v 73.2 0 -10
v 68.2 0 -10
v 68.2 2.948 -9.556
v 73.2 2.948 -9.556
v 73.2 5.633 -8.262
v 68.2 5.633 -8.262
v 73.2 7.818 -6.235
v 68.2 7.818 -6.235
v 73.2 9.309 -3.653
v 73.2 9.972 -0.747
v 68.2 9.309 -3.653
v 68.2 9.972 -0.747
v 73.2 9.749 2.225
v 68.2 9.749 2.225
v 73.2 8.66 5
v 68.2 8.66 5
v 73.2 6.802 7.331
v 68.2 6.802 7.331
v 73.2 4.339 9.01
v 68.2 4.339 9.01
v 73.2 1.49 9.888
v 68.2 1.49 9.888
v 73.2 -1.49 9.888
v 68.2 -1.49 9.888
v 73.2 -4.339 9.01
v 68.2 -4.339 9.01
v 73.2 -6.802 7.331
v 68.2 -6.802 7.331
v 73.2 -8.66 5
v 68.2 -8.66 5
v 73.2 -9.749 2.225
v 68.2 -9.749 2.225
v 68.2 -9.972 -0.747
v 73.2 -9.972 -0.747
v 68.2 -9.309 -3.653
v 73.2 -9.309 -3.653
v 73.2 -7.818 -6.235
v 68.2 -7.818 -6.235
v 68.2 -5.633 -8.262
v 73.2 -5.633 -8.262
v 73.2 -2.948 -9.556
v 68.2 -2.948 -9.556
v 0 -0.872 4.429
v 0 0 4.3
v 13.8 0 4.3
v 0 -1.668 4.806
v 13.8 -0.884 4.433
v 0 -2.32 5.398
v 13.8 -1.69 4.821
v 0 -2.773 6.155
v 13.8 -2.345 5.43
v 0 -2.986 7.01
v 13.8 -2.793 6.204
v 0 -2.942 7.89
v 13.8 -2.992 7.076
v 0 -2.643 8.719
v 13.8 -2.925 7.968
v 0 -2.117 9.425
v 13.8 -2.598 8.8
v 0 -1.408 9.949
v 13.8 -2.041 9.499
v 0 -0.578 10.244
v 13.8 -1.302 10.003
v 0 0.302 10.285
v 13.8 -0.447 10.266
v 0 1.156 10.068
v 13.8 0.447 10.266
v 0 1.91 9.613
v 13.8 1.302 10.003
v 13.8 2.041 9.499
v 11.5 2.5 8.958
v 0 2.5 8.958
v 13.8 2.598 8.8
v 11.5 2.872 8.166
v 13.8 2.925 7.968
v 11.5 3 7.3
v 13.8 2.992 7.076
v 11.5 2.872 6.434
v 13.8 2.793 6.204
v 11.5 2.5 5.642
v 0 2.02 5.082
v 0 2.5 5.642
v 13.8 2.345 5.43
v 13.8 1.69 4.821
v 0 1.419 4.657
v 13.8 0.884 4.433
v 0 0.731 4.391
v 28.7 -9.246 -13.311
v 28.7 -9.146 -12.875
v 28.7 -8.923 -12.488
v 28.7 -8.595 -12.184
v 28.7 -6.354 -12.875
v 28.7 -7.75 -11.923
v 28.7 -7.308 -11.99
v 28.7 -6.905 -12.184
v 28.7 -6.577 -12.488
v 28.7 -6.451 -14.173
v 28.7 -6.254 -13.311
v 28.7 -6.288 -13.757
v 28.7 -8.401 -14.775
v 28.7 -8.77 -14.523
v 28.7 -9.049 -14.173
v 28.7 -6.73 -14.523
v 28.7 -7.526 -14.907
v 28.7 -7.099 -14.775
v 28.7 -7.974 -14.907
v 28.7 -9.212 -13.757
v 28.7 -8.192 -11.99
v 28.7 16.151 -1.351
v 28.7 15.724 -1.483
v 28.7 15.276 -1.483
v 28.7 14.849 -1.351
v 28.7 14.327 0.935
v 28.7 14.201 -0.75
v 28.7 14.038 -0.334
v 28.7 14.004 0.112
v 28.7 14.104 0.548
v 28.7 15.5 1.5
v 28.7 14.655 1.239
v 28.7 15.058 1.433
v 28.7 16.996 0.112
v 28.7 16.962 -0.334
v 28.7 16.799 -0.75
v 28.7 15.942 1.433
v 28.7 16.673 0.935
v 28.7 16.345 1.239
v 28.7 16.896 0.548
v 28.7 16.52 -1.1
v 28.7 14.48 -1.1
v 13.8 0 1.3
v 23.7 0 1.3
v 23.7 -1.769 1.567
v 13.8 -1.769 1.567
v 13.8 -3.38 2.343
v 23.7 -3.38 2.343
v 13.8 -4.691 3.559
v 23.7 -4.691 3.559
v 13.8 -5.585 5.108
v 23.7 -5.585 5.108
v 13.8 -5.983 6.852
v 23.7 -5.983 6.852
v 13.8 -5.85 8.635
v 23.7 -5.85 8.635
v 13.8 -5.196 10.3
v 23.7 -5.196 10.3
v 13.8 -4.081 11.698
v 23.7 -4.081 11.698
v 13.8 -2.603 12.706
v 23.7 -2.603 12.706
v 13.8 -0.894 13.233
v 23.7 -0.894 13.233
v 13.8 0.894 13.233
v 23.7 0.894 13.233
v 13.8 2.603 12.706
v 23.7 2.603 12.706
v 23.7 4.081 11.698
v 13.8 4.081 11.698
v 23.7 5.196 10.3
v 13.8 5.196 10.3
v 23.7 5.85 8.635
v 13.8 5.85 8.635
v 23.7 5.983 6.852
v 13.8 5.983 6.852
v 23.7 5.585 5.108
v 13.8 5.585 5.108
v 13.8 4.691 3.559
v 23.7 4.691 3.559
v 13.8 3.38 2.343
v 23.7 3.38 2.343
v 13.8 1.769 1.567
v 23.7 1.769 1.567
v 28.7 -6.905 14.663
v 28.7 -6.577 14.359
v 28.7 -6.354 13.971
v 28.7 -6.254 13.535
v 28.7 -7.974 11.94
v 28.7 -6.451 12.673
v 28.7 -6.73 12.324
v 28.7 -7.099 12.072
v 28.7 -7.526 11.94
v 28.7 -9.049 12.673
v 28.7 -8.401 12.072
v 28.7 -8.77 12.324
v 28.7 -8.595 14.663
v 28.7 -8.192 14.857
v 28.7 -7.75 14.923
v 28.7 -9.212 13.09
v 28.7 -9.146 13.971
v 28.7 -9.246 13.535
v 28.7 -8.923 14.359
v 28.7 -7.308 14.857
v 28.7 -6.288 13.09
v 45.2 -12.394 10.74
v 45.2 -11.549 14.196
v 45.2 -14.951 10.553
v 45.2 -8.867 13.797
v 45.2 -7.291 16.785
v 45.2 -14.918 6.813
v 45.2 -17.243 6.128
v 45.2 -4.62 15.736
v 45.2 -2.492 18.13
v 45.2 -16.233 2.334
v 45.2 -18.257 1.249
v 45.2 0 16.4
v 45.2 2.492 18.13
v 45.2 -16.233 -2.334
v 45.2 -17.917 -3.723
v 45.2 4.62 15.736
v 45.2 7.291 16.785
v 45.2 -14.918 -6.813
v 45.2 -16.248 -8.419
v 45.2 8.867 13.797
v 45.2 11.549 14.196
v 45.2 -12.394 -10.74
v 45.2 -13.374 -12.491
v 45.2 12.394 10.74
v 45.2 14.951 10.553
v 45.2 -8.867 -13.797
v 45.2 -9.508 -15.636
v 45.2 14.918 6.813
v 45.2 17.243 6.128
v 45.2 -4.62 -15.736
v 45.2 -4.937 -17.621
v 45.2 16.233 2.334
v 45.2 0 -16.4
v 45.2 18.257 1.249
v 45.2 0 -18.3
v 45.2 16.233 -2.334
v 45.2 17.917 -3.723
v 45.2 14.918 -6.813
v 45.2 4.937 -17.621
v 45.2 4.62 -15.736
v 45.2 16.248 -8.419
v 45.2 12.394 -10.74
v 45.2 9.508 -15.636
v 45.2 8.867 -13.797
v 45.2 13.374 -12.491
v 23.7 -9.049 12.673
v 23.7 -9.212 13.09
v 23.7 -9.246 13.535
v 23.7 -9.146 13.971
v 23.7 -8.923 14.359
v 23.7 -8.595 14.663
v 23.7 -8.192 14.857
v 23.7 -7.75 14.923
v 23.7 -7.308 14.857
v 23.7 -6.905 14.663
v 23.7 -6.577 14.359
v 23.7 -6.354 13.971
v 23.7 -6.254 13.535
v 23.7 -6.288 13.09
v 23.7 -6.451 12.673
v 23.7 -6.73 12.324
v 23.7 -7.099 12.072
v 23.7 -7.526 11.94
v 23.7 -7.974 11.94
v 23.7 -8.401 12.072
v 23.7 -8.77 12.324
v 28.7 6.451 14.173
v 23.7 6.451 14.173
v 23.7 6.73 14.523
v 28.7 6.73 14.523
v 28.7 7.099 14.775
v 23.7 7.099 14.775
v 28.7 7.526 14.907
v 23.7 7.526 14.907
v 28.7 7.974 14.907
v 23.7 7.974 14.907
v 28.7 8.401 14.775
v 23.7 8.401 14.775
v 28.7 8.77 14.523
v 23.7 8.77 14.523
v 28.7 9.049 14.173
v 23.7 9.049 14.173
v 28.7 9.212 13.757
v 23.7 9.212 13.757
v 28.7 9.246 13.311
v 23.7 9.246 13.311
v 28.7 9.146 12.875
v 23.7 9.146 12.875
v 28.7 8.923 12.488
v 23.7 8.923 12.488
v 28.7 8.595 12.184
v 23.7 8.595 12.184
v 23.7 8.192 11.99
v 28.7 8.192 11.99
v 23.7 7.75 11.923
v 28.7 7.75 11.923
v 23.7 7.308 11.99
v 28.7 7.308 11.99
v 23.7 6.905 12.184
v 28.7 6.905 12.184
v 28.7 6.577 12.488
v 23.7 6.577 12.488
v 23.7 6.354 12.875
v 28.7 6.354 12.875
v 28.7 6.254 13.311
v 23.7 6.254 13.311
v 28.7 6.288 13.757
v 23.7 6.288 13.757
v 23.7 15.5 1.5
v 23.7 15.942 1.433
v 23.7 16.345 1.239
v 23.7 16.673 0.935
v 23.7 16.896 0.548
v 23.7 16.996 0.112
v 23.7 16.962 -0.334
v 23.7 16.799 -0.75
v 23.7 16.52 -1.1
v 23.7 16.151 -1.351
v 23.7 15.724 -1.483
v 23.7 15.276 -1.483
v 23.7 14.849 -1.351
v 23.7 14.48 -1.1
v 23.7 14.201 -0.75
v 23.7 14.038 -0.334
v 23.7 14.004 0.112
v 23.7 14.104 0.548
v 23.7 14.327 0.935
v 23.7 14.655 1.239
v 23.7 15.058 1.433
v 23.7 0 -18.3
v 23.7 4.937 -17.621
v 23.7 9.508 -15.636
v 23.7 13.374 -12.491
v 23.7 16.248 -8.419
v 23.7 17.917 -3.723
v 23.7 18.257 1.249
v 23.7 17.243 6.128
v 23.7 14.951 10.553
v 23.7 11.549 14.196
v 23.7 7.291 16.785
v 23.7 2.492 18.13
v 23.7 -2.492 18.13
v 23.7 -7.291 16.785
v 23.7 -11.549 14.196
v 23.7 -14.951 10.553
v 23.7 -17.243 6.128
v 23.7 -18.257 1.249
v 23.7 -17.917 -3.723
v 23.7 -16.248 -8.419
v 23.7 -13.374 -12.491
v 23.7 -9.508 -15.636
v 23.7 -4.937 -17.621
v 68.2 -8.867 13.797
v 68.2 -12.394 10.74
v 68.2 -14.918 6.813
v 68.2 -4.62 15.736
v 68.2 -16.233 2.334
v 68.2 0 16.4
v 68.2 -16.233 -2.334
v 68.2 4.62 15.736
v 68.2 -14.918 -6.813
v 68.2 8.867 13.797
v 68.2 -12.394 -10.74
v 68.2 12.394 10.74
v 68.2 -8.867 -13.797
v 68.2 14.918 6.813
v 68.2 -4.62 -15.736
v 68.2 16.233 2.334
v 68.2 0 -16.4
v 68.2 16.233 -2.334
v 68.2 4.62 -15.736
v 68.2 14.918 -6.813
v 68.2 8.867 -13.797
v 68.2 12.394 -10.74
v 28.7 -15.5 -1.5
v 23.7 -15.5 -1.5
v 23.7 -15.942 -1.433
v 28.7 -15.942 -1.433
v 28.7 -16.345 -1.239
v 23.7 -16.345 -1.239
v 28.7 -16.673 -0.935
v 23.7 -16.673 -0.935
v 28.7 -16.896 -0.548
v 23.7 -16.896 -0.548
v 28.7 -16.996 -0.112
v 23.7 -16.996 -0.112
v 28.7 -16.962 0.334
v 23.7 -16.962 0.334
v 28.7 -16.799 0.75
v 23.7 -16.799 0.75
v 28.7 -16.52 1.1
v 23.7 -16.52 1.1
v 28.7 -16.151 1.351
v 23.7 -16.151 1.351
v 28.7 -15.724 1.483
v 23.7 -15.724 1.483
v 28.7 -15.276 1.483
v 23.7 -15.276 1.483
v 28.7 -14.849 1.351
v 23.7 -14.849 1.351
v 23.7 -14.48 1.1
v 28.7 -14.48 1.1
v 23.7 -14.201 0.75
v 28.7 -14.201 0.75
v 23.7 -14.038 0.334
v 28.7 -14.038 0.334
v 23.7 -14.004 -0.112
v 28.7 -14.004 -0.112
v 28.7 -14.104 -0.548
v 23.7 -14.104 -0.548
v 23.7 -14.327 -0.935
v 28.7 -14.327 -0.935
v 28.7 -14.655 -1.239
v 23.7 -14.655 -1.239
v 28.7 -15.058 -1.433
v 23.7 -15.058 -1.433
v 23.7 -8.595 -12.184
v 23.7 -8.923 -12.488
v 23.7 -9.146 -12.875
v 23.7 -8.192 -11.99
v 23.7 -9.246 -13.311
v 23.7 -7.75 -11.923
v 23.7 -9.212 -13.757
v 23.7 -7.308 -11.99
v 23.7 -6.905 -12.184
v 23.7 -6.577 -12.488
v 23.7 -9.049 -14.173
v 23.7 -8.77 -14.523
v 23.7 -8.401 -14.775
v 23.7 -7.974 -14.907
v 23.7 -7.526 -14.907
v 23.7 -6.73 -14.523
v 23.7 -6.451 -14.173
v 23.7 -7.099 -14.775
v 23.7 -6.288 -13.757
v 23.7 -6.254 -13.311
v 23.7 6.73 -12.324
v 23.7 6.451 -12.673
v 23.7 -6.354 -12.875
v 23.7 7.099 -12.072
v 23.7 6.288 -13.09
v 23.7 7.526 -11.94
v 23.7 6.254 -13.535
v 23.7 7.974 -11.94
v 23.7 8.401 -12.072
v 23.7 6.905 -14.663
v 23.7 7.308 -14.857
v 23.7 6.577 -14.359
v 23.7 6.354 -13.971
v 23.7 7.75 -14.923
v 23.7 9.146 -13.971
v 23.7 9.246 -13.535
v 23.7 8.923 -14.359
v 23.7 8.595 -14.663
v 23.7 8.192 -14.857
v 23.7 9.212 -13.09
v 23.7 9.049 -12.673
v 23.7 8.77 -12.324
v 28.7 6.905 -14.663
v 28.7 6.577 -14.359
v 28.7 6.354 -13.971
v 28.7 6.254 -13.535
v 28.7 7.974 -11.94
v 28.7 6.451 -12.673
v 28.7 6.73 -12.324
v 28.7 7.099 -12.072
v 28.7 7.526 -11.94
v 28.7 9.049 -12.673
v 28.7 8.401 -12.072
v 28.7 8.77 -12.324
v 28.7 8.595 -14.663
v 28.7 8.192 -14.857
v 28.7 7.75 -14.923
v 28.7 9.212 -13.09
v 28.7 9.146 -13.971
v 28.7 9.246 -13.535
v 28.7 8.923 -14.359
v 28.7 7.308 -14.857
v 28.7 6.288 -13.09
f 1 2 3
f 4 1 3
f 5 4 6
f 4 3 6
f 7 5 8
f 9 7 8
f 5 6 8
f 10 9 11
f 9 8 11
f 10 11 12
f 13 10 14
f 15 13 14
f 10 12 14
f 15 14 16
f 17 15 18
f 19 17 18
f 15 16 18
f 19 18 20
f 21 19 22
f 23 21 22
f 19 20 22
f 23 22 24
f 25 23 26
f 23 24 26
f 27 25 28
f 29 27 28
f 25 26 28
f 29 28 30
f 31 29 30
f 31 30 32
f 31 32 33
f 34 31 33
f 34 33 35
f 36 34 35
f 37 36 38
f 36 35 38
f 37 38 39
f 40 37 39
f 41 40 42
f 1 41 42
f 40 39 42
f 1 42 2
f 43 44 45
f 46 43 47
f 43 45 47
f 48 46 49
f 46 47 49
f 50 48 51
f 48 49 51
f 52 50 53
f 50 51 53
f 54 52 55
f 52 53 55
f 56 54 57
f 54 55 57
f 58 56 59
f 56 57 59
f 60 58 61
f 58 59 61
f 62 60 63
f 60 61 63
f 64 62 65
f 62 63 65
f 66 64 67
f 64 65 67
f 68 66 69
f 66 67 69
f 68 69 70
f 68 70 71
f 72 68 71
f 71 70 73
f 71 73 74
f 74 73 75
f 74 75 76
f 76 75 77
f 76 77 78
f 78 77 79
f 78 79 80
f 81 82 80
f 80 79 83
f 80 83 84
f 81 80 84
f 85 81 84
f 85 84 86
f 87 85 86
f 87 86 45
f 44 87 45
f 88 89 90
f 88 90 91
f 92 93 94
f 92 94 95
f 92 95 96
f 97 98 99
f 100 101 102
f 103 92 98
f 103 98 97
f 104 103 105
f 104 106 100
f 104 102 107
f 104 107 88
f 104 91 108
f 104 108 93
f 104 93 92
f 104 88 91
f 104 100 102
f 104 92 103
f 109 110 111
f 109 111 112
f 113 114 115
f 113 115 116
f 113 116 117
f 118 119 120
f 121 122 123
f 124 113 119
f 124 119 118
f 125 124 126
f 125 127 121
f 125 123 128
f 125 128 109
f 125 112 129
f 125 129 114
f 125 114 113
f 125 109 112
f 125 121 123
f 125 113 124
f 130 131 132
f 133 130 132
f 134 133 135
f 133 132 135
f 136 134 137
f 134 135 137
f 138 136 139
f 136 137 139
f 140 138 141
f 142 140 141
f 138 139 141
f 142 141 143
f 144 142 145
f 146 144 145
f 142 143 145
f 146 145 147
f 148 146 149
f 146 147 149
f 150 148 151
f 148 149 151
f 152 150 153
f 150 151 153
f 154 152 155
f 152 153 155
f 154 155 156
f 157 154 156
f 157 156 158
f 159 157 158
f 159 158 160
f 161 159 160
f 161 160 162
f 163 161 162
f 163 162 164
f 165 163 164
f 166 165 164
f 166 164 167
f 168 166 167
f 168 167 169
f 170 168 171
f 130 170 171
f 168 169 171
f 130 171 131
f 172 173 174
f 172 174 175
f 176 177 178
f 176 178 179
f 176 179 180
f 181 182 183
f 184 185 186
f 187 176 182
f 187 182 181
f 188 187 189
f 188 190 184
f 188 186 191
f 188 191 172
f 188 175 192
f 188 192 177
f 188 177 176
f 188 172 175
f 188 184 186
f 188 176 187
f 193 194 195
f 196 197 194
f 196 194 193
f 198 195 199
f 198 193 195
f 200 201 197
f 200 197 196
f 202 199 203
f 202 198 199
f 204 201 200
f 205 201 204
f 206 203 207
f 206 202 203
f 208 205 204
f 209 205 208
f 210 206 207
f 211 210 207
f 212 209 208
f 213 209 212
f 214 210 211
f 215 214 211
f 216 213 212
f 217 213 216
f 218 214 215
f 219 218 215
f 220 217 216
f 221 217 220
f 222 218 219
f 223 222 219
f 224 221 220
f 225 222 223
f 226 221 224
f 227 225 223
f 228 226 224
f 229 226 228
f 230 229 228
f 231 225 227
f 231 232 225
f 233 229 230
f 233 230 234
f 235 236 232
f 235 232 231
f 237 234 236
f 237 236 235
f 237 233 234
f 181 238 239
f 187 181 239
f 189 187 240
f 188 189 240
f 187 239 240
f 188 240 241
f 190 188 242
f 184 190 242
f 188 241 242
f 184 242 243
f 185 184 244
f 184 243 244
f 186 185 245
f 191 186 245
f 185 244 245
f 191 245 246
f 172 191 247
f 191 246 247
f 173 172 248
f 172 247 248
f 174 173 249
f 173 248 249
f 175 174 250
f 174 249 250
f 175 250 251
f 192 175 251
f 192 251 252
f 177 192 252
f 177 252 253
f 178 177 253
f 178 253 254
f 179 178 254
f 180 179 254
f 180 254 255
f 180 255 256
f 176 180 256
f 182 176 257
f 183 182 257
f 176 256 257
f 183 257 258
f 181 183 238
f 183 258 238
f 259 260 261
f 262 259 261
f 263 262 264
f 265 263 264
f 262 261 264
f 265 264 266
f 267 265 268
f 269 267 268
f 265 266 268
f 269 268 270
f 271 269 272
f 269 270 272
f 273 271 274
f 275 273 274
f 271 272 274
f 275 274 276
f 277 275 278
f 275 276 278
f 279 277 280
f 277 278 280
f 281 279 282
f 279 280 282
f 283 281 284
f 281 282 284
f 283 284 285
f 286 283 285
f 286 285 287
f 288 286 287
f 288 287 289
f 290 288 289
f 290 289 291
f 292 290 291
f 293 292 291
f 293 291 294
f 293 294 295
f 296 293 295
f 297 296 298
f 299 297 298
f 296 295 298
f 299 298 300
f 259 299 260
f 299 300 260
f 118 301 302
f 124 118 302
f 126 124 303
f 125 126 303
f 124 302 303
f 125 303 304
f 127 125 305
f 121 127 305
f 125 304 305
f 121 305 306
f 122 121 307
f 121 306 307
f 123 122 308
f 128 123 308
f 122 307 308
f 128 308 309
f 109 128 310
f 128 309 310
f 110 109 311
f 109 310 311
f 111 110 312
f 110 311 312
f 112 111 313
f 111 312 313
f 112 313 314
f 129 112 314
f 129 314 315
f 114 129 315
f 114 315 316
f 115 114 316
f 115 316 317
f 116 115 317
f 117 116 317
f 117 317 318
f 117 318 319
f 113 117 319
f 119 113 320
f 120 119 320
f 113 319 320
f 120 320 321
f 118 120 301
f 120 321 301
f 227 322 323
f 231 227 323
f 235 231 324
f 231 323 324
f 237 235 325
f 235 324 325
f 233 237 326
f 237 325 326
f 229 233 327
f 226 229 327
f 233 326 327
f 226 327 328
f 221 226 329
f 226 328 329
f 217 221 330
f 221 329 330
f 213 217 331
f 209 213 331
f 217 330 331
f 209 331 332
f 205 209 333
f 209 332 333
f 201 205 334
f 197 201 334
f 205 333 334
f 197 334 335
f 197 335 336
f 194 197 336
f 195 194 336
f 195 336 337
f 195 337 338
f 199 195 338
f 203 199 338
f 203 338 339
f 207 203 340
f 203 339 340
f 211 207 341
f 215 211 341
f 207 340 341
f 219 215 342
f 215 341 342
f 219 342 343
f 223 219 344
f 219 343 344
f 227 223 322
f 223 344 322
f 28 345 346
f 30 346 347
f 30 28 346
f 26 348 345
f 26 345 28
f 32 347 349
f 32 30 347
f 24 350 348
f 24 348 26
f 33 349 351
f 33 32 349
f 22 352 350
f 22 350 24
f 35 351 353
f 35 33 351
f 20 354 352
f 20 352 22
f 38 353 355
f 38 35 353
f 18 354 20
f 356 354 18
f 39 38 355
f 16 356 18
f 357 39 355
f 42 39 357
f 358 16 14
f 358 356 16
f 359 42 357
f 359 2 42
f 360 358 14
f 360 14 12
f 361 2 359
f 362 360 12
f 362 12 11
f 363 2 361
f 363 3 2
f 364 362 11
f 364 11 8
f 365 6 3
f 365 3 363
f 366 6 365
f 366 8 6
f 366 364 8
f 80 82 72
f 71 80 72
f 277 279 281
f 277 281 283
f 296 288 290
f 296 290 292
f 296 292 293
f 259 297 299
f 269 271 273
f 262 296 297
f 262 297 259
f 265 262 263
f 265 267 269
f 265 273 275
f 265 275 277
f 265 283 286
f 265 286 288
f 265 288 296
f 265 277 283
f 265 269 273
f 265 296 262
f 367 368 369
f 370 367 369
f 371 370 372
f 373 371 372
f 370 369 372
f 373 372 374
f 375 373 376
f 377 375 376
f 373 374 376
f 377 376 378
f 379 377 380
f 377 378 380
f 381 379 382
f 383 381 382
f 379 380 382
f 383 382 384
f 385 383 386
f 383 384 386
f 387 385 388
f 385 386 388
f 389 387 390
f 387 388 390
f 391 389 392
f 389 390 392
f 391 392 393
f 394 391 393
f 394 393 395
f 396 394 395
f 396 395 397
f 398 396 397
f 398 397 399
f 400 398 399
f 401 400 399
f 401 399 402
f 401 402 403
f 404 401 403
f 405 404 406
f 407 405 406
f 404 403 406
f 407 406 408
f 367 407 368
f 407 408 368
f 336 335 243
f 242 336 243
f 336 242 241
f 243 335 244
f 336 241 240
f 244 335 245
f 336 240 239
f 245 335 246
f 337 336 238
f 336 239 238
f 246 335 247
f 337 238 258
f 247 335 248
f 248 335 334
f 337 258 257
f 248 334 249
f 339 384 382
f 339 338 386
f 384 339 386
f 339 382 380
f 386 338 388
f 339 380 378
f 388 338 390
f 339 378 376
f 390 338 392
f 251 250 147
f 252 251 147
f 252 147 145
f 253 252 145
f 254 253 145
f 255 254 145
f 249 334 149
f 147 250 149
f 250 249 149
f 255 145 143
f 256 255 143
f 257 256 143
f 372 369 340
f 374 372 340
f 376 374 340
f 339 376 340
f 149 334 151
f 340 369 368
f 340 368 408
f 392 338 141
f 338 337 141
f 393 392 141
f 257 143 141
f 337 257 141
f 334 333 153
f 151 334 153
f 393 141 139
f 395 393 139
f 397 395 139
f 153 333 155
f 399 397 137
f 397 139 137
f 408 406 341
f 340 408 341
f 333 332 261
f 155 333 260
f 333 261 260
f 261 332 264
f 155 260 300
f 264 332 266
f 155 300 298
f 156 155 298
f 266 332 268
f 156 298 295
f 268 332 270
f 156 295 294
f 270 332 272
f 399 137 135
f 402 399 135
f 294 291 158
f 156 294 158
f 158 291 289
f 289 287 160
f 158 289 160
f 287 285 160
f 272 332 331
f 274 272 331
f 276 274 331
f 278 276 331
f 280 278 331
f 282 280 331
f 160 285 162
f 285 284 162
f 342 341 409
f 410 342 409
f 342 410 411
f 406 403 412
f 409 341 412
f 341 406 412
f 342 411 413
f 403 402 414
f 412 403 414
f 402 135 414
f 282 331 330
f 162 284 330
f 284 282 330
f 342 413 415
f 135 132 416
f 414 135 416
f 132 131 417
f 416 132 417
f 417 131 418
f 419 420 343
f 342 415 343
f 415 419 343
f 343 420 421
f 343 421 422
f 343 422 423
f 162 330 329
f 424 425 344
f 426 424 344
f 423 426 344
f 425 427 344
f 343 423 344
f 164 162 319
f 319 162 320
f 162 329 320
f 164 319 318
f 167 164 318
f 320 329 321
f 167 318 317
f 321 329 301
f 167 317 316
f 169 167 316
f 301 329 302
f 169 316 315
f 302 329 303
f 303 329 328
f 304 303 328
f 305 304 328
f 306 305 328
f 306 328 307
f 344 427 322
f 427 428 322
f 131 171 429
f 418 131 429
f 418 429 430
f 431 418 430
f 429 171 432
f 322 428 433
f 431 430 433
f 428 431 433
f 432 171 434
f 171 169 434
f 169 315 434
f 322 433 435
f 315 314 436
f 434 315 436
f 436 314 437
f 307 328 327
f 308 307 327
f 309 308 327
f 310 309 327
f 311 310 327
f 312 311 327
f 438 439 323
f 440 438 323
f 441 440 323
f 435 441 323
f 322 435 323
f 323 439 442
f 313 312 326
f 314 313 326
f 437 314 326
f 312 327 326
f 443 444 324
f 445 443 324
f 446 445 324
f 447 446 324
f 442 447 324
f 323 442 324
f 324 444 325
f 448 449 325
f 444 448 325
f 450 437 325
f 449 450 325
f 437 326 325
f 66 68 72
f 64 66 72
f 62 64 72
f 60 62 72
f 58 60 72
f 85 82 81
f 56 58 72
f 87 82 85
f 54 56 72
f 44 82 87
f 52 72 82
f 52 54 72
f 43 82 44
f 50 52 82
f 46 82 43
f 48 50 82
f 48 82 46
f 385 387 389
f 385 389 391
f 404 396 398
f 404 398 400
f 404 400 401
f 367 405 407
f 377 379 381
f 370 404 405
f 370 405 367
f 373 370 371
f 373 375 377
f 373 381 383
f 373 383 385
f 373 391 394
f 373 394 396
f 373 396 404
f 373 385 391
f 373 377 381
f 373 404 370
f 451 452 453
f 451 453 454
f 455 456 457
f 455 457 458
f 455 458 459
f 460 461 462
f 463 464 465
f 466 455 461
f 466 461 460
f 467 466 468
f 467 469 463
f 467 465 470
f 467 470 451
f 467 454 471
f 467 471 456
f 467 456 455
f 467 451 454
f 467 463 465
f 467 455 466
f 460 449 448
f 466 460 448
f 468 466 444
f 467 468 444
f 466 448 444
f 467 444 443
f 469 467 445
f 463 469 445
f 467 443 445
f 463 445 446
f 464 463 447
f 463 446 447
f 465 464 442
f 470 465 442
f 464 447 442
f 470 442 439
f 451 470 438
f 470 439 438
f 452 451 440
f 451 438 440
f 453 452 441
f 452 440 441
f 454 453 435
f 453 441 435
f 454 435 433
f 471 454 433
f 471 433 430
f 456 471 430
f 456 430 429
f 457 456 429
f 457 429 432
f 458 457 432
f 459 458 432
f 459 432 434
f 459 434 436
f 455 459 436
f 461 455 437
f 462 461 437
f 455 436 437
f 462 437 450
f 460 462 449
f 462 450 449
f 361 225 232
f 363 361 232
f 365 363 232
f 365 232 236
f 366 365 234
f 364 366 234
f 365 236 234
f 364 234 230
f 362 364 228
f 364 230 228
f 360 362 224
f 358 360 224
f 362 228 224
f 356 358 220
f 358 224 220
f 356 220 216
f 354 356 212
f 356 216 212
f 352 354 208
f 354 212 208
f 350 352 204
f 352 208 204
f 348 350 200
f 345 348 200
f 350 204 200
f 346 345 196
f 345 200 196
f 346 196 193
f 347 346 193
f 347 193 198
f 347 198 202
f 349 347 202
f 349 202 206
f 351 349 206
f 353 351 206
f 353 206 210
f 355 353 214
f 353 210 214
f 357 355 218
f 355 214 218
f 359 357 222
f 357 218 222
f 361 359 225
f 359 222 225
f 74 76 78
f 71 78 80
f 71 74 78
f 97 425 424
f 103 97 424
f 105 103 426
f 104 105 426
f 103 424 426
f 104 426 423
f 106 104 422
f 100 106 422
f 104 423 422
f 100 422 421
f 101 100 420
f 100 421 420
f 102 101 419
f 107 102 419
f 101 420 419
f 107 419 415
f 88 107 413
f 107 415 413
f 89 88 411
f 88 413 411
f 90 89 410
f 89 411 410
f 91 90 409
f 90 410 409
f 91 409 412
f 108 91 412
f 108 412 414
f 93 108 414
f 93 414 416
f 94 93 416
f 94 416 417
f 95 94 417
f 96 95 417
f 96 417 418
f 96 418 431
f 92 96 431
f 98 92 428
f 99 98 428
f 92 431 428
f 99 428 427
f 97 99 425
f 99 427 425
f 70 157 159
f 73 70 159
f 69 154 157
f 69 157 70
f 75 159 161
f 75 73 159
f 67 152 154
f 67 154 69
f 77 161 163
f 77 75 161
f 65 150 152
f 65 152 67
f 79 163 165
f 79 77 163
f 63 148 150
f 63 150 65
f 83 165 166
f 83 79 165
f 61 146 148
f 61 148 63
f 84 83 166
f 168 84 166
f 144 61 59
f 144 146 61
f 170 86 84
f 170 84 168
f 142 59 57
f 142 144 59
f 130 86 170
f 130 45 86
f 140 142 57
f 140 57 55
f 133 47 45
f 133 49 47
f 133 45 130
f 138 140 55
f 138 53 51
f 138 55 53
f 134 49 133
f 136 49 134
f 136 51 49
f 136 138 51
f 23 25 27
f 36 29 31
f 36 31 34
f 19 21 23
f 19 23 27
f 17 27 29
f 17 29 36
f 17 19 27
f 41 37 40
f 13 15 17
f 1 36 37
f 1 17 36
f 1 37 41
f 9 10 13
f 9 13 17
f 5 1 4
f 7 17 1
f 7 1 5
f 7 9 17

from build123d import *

# Parameters (mm, degrees)
SKETCH_1_R               = 3
EXTRUDE_1_DEPTH          = 13.8
SKETCH_2_R               = 6
EXTRUDE_2_DEPTH          = 9.9
SKETCH_3_R               = 18.3
EXTRUDE_3_DEPTH          = 21.5
SKETCH_4_R               = 16.4
EXTRUDE_4_DEPTH          = 23
SKETCH_5_R               = 10
EXTRUDE_5_DEPTH          = 5
CUT_EXTRUDE_1_DEPTH      = 11.5
SKETCH_7_R               = 1.5
CUT_EXTRUDE_2_DEPTH      = 5
PATTERN_CIRCULAR_1_COUNT = 6
SKETCH_8_R               = 8.963335845
CUT_EXTRUDE_3_DEPTH      = 23.7
SKETCH_9_R               = 6
EXTRUDE_6_DEPTH          = 9.9
SKETCH_10_R              = 3
EXTRUDE_7_DEPTH          = 13.8
CUT_EXTRUDE_4_DEPTH      = 11.5


with BuildPart() as part:
    # 草图1 → 凸台-拉伸1 (new body)
    with BuildSketch(Plane(origin=(0, 0, 0), x_dir=(0, 0, -1), z_dir=(1, 0, 0))):
        with Locations(Location((0, 0, 0), (0, 0, 180))):
            Circle(SKETCH_1_R)
    extrude(amount=EXTRUDE_1_DEPTH)

    # 草图2 → 凸台-拉伸2 (add)
    with BuildSketch(Plane(origin=(13.8, 0, 0), x_dir=(0, 0, -1), z_dir=(1, 0, 0))):
        Circle(SKETCH_2_R)
    extrude(amount=EXTRUDE_2_DEPTH)

    # 草图3 → 凸台-拉伸3 (add)
    with BuildSketch(Plane(origin=(23.7, 0, 0), x_dir=(0, 0, -1), z_dir=(1, 0, 0))):
        Circle(SKETCH_3_R)
    extrude(amount=EXTRUDE_3_DEPTH)

    # 草图4 → 凸台-拉伸4 (add)
    with BuildSketch(Plane(origin=(45.2, 0, 0), x_dir=(0, 0, -1), z_dir=(1, 0, 0))):
        Circle(SKETCH_4_R)
    extrude(amount=EXTRUDE_4_DEPTH)

    # 草图5 → 凸台-拉伸5 (add)
    with BuildSketch(Plane(origin=(68.2, 0, 0), x_dir=(0, 0, -1), z_dir=(1, 0, 0))):
        Circle(SKETCH_5_R)
    extrude(amount=EXTRUDE_5_DEPTH)

    # 草图6 → 切除-拉伸1 (cut)
    with BuildSketch(Plane.ZY):
        Polygon((-1.658312395, 2.5), (1.658312395, 2.5), (1.914814447, 4.033173691), (-2.453659142, 4.033173691), align=None)
    extrude(amount=-CUT_EXTRUDE_1_DEPTH, mode=Mode.SUBTRACT)

    # 草图7 → 切除-拉伸2 (cut)
    with BuildSketch(Plane.ZY.offset(-23.7)):
        with Locations((0, 15.5)):
            Circle(SKETCH_7_R)
    cut_extrude_2 = extrude(amount=-CUT_EXTRUDE_2_DEPTH, mode=Mode.SUBTRACT)

    # 阵列(圆周)1: 切除-拉伸2 ×6 about axis
    pattern_circular_1_axis = Axis((0, 0, 0), (1, 0, 0))
    for i in range(1, PATTERN_CIRCULAR_1_COUNT):
        add(cut_extrude_2.rotate(pattern_circular_1_axis, i * 360 / PATTERN_CIRCULAR_1_COUNT), mode=Mode.SUBTRACT)

    # 草图8 → 切除-拉伸3 (cut)
    with BuildSketch(Plane.ZY):
        Circle(SKETCH_8_R)
    extrude(amount=-CUT_EXTRUDE_3_DEPTH, mode=Mode.SUBTRACT)

    # 草图9 → 凸台-拉伸6 (add)
    with BuildSketch(Plane.ZY.offset(-23.7)):
        with Locations(Location((7.3, 0, 0), (0, 0, 180))):
            Circle(SKETCH_9_R)
    extrude(amount=EXTRUDE_6_DEPTH)

    # 草图10 → 凸台-拉伸7 (add)
    with BuildSketch(Plane.ZY.offset(-13.8)):
        with Locations(Location((7.3, 0, 0), (0, 0, 180))):
            Circle(SKETCH_10_R)
    extrude(amount=EXTRUDE_7_DEPTH)

    # 草图11 → 切除-拉伸4 (cut)
    with BuildSketch(Plane.ZY):
        Polygon((5.641687605, 2.5), (8.958312395, 2.5), (9.936132203, 4.4850308), (5.641687605, 3.798836175), align=None)
    extrude(amount=-CUT_EXTRUDE_4_DEPTH, mode=Mode.SUBTRACT)


solid = part.part
